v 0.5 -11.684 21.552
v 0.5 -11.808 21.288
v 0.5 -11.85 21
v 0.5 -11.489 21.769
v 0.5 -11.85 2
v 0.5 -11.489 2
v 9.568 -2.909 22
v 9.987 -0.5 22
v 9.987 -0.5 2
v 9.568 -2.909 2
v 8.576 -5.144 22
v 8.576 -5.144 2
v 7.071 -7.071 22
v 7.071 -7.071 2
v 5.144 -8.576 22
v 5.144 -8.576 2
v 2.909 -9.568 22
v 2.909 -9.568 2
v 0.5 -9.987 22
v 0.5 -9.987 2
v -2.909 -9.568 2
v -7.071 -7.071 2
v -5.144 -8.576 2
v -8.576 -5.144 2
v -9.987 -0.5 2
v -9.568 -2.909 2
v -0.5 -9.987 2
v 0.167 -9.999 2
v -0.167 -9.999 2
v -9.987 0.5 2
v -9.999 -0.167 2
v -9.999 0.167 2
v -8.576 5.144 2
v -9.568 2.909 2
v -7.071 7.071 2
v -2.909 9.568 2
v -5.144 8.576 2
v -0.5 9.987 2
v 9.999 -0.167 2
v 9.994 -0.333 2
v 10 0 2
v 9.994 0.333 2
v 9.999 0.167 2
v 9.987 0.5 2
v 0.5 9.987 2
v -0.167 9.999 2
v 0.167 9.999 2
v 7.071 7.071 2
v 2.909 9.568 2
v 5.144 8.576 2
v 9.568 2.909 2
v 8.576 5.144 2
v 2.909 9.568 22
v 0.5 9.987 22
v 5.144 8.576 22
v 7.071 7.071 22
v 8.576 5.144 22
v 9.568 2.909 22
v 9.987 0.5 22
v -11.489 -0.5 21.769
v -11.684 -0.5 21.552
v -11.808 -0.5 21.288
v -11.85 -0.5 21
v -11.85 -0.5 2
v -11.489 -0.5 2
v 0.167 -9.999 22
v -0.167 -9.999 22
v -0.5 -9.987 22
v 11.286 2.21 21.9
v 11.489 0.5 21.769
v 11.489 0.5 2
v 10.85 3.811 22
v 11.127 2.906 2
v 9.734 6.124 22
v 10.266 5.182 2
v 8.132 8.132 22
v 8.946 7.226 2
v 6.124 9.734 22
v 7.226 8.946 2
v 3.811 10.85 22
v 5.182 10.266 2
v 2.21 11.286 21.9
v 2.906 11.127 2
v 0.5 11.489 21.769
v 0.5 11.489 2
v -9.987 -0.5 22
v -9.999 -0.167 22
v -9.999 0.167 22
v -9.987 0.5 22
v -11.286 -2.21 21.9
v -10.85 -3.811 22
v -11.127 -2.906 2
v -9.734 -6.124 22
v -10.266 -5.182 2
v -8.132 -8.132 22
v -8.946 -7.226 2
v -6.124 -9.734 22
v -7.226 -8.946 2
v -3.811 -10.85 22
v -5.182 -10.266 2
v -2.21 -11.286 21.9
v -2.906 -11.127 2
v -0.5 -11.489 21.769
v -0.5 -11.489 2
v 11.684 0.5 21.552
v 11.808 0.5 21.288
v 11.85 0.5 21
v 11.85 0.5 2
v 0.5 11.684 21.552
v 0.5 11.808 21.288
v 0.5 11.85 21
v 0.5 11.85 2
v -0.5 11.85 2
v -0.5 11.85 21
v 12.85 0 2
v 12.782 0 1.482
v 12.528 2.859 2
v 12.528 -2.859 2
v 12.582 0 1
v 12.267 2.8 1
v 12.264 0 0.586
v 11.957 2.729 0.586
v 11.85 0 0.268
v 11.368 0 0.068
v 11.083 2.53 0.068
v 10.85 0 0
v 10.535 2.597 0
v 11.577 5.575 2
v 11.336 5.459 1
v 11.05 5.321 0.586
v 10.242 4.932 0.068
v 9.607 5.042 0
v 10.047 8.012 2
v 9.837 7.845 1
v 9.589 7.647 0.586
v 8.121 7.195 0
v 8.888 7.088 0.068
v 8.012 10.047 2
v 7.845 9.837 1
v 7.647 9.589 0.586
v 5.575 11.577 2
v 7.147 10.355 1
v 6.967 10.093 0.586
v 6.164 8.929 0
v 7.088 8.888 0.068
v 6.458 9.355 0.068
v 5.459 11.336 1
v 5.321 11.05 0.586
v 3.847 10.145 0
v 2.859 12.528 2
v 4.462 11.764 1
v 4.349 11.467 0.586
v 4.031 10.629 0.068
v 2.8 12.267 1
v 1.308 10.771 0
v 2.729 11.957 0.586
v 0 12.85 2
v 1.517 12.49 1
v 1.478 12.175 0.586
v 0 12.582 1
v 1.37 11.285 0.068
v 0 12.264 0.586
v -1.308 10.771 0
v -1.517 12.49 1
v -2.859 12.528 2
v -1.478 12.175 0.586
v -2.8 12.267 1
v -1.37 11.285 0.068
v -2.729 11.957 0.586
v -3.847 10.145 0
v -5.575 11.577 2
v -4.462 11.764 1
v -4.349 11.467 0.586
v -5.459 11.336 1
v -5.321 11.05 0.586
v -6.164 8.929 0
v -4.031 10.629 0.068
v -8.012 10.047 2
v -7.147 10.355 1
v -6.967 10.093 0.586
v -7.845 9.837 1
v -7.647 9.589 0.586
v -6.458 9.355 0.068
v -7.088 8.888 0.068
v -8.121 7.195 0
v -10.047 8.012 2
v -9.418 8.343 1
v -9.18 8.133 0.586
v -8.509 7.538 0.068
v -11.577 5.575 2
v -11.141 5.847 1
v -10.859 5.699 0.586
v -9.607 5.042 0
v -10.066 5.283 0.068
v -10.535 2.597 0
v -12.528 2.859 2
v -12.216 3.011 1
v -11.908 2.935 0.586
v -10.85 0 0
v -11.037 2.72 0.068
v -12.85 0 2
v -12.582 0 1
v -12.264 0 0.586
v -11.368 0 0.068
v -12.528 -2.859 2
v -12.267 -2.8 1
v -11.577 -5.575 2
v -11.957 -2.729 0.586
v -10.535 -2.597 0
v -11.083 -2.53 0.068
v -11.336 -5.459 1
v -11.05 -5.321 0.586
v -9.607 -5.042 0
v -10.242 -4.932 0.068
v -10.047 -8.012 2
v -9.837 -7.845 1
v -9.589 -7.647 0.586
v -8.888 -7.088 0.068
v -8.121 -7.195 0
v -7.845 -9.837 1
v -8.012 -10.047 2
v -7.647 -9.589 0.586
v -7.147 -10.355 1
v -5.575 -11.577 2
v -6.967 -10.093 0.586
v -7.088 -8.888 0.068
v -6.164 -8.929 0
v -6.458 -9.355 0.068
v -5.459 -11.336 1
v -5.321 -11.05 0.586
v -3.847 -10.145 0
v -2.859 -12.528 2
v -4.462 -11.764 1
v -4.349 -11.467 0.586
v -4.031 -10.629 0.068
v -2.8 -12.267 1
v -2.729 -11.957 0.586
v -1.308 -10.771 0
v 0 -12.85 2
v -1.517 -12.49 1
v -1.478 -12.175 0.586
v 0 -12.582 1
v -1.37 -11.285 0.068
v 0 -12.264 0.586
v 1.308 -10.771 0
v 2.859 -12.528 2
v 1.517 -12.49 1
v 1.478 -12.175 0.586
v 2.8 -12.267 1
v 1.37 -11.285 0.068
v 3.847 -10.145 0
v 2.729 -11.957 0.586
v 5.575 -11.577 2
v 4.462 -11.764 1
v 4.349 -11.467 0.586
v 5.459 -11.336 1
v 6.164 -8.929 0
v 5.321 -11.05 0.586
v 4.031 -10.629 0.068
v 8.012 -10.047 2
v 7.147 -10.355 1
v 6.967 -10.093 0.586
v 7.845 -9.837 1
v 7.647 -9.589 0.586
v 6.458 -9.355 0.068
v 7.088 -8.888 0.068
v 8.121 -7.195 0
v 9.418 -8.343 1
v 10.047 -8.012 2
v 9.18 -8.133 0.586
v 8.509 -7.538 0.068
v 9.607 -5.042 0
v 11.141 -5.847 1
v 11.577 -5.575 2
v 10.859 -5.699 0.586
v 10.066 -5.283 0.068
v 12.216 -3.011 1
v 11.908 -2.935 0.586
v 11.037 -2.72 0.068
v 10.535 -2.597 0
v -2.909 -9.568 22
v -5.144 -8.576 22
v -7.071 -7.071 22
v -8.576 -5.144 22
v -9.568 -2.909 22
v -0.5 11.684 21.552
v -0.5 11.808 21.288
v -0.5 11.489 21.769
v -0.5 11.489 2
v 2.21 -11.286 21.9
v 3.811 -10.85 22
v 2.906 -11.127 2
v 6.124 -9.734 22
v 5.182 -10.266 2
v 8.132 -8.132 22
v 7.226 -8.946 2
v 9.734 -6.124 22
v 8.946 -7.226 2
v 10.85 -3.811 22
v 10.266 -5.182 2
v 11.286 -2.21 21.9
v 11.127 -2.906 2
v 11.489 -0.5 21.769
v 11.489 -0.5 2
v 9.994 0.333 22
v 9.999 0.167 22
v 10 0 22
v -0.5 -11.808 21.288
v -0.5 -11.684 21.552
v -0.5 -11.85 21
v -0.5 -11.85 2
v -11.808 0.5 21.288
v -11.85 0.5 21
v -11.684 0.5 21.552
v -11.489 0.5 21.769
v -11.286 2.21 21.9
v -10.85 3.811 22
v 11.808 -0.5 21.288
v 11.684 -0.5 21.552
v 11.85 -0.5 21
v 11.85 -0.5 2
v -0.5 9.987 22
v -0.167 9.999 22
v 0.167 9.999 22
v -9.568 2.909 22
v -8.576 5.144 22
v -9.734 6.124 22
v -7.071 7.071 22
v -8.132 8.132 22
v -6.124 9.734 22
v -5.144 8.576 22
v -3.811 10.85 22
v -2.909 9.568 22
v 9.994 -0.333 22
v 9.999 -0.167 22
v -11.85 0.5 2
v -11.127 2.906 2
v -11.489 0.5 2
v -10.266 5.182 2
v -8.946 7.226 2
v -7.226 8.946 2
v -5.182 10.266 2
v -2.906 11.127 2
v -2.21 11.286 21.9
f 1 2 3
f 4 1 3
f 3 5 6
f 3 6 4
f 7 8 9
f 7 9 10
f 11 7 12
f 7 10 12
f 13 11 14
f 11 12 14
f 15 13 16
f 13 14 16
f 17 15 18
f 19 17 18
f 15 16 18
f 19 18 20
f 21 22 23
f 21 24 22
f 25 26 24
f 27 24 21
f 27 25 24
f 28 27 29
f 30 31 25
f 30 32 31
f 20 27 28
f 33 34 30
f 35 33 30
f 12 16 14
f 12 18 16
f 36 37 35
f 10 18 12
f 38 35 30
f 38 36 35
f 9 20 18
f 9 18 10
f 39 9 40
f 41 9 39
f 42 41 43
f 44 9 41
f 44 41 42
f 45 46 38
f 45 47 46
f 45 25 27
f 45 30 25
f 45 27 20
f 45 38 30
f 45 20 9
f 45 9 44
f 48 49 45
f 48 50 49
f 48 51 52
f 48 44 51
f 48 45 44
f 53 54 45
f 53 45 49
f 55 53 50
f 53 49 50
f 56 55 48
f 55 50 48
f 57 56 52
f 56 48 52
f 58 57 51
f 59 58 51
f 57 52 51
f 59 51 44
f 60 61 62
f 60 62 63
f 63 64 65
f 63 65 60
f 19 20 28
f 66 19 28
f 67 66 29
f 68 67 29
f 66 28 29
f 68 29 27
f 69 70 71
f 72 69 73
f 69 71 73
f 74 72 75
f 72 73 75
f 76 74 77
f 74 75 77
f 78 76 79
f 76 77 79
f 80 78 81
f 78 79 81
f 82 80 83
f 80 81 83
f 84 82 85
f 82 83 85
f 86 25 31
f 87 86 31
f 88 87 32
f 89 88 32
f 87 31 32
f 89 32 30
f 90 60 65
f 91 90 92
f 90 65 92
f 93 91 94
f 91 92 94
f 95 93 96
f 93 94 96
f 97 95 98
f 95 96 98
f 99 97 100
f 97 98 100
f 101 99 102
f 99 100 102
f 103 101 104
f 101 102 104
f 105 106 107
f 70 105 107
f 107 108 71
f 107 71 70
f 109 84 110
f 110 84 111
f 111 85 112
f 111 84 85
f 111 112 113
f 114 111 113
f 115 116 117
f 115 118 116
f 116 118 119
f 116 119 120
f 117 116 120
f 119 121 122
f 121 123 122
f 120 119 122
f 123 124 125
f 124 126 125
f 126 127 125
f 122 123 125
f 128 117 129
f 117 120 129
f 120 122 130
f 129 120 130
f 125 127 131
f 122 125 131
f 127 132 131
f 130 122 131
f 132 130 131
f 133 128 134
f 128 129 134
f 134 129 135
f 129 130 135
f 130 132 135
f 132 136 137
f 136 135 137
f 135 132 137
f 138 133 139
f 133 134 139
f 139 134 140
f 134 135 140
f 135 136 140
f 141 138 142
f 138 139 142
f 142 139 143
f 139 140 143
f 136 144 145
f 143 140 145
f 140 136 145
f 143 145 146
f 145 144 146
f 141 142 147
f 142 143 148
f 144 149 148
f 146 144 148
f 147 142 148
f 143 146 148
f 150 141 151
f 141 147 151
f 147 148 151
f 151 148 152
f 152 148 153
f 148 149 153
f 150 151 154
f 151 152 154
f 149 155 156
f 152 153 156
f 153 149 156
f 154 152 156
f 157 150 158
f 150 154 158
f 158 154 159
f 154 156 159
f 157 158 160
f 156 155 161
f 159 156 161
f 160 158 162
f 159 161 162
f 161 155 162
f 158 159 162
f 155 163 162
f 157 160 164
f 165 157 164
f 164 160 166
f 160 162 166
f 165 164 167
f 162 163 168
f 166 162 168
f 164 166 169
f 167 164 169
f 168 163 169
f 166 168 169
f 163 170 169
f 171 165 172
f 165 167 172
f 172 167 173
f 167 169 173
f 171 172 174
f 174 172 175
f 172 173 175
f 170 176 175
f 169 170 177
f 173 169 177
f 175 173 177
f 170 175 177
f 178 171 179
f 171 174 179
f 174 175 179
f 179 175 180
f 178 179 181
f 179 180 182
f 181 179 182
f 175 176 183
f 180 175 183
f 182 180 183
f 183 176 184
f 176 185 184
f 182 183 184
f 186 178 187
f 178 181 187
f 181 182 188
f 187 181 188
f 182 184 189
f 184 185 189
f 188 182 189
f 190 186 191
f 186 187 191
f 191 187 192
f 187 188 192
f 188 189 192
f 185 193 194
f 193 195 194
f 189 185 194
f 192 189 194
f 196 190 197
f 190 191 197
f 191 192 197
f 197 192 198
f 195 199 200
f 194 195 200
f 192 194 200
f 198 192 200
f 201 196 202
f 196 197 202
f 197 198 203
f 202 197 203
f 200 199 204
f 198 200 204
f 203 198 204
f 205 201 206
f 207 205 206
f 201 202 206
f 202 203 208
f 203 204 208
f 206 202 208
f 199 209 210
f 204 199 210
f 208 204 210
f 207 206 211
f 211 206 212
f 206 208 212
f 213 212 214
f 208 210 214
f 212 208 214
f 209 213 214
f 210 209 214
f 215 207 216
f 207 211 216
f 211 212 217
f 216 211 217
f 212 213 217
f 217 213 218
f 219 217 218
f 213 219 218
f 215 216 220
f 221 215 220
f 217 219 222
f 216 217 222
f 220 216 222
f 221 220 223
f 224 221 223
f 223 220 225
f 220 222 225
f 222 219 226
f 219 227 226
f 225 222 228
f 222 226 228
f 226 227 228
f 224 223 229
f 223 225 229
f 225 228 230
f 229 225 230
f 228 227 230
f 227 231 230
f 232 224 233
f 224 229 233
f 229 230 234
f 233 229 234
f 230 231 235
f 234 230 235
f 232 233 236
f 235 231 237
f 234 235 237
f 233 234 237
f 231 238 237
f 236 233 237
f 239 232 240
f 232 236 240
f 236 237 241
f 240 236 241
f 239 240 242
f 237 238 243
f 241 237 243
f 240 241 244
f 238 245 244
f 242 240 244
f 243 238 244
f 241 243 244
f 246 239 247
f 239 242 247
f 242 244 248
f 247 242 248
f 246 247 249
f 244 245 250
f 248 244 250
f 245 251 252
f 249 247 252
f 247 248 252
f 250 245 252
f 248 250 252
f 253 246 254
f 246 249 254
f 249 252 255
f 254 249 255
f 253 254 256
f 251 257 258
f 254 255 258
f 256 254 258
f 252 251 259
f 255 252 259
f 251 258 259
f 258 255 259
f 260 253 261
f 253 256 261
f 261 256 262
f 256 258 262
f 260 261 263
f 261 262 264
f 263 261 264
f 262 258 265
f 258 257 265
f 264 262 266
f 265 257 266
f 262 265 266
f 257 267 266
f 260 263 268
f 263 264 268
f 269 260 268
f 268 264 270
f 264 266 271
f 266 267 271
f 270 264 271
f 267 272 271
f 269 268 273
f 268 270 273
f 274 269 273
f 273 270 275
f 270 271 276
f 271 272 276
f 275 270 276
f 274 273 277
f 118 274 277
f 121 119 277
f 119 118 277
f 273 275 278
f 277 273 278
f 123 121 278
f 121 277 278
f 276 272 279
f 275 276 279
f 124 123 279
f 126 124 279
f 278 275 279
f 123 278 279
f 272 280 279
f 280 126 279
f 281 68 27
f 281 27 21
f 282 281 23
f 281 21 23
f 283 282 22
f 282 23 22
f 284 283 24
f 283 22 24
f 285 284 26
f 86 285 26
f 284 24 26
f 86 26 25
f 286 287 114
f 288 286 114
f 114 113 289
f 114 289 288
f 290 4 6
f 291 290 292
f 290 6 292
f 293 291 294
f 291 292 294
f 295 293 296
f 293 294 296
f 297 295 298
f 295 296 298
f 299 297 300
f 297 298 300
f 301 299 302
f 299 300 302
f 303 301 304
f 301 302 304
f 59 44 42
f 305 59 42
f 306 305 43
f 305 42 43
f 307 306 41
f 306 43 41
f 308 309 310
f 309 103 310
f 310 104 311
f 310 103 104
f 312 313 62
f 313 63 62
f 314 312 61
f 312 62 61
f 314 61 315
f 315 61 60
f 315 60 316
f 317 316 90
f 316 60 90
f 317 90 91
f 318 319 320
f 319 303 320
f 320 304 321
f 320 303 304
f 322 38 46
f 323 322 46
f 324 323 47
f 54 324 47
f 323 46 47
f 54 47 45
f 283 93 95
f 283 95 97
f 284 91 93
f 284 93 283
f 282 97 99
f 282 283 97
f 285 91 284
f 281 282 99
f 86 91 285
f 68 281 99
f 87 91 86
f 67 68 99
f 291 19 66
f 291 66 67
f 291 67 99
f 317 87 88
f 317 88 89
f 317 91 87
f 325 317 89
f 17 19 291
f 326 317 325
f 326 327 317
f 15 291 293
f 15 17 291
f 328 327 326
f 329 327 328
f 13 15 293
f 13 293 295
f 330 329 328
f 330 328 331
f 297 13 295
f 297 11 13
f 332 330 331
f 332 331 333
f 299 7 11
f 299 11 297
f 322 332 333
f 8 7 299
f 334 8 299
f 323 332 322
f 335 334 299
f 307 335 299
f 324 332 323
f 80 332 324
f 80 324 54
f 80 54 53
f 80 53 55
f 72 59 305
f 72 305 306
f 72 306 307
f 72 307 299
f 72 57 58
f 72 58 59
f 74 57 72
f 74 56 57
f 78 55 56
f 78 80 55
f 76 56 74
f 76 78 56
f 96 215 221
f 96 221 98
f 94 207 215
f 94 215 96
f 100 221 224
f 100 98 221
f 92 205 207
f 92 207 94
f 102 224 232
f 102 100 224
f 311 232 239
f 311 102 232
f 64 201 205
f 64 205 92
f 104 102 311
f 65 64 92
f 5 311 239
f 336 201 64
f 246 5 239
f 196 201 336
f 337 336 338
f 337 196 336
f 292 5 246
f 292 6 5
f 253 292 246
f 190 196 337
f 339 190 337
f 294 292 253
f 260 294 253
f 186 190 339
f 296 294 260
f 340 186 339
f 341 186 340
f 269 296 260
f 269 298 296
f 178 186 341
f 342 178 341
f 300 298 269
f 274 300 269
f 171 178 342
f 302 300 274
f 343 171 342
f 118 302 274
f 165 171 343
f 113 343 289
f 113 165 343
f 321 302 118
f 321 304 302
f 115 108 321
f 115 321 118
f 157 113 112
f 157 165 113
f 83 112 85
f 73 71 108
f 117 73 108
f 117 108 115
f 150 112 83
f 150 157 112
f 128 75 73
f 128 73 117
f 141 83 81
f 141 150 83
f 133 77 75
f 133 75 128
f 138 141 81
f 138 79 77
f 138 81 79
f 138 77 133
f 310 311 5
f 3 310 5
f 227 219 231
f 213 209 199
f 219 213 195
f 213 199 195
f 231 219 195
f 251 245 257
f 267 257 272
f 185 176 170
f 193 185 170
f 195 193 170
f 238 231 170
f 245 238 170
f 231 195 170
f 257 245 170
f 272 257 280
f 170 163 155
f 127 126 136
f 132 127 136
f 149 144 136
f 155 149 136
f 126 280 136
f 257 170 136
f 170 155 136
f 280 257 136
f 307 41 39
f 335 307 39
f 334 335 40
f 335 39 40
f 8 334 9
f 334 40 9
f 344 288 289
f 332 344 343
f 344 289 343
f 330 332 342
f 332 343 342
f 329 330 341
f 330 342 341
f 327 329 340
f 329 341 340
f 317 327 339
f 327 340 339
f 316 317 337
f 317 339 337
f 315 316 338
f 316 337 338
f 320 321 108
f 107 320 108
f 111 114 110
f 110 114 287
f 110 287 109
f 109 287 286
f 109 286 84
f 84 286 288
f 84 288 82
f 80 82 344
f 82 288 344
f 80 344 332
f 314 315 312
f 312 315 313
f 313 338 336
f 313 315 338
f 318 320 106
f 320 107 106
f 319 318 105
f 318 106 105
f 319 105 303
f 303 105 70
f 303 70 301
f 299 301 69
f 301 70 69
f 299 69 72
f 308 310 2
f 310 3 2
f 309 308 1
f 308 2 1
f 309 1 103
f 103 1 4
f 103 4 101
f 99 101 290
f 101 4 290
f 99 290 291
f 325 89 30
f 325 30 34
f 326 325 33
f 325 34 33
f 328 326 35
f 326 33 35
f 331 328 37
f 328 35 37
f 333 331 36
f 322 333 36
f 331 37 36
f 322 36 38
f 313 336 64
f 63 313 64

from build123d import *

# Parameters (mm, degrees)
F0_R     = 12.85
F1_DEPTH = 2
F3_DEPTH = 20
F4_R     = 1
F5_R     = 1.99999


# Not quite as in the source:
# - a fillet or chamfer is up to 0.001 mm smaller than in the source, because OpenCascade refuses the exact size


with BuildPart() as f1:
    # F0 (on Top) → F1 (new body)
    with BuildSketch(Plane.XY):
        Circle(F0_R)
    extrude(amount=F1_DEPTH)

    # F2 (on face) → F3 (join)
    with BuildSketch(Plane.XY.offset(2)):
        with BuildLine():
            ThreePointArc((11.4891252931, -0.5), (11.4972810018, -0.2500591226), (11.5, 0))
            ThreePointArc((11.5, 0), (11.4972810018, 0.2500591226), (11.4891252931, 0.5))
            Line((11.4891252931, 0.5), (9.9874921777, 0.5))
            ThreePointArc((9.9874921777, 0.5), (9.9968725554, 0.2500782106), (10, 0))
            ThreePointArc((10, 0), (9.9968725554, -0.2500782106), (9.9874921777, -0.5))
            Line((9.9874921777, -0.5), (11.4891252931, -0.5))
        make_face()
        with BuildLine():
            ThreePointArc((11.4891252931, 0.5), (11.4972810018, 0.2500591226), (11.5, 0))
            ThreePointArc((11.5, 0), (11.4972810018, -0.2500591226), (11.4891252931, -0.5))
            Line((11.4891252931, -0.5), (11.85, -0.5))
            Line((11.85, -0.5), (11.85, 0.5))
            Line((11.85, 0.5), (11.4891252931, 0.5))
        make_face()
        with BuildLine():
            Line((9.9874921777, 0.5), (11.4891252931, 0.5))
            ThreePointArc((11.4891252931, 0.5), (8.1317279836, 8.1317279836), (0.5, 11.4891252931))
            Line((0.5, 11.4891252931), (0.5, 9.9874921777))
            ThreePointArc((0.5, 9.9874921777), (7.0710678119, 7.0710678119), (9.9874921777, 0.5))
        make_face()
        with BuildLine():
            ThreePointArc((0.5, -11.4891252931), (8.1317279836, -8.1317279836), (11.4891252931, -0.5))
            Line((11.4891252931, -0.5), (9.9874921777, -0.5))
            ThreePointArc((9.9874921777, -0.5), (7.0710678119, -7.0710678119), (0.5, -9.9874921777))
            Line((0.5, -9.9874921777), (0.5, -11.4891252931))
        make_face()
        with BuildLine():
            Line((0.5, 9.9874921777), (0.5, 11.4891252931))
            ThreePointArc((0.5, 11.4891252931), (0, 11.5), (-0.5, 11.4891252931))
            Line((-0.5, 11.4891252931), (-0.5, 9.9874921777))
            ThreePointArc((-0.5, 9.9874921777), (0, 10), (0.5, 9.9874921777))
        make_face()
        with BuildLine():
            ThreePointArc((-0.5, 11.4891252931), (0, 11.5), (0.5, 11.4891252931))
            Line((0.5, 11.4891252931), (0.5, 11.85))
            Line((0.5, 11.85), (-0.5, 11.85))
            Line((-0.5, 11.85), (-0.5, 11.4891252931))
        make_face()
        with BuildLine():
            Line((0.5, -11.85), (0.5, -11.4891252931))
            ThreePointArc((0.5, -11.4891252931), (0, -11.5), (-0.5, -11.4891252931))
            Line((-0.5, -11.4891252931), (-0.5, -11.85))
            Line((-0.5, -11.85), (0.5, -11.85))
        make_face()
        with BuildLine():
            ThreePointArc((-0.5, -11.4891252931), (0, -11.5), (0.5, -11.4891252931))
            Line((0.5, -11.4891252931), (0.5, -9.9874921777))
            ThreePointArc((0.5, -9.9874921777), (0, -10), (-0.5, -9.9874921777))
            Line((-0.5, -9.9874921777), (-0.5, -11.4891252931))
        make_face()
        with BuildLine():
            Line((-0.5, 9.9874921777), (-0.5, 11.4891252931))
            ThreePointArc((-0.5, 11.4891252931), (-8.1317279836, 8.1317279836), (-11.4891252931, 0.5))
            Line((-11.4891252931, 0.5), (-9.9874921777, 0.5))
            ThreePointArc((-9.9874921777, 0.5), (-7.0710678119, 7.0710678119), (-0.5, 9.9874921777))
        make_face()
        with BuildLine():
            ThreePointArc((-11.4891252931, -0.5), (-8.1317279836, -8.1317279836), (-0.5, -11.4891252931))
            Line((-0.5, -11.4891252931), (-0.5, -9.9874921777))
            ThreePointArc((-0.5, -9.9874921777), (-7.0710678119, -7.0710678119), (-9.9874921777, -0.5))
            Line((-9.9874921777, -0.5), (-11.4891252931, -0.5))
        make_face()
        with BuildLine():
            Line((-9.9874921777, 0.5), (-11.4891252931, 0.5))
            ThreePointArc((-11.4891252931, 0.5), (-11.5, 0), (-11.4891252931, -0.5))
            Line((-11.4891252931, -0.5), (-9.9874921777, -0.5))
            ThreePointArc((-9.9874921777, -0.5), (-10, 0), (-9.9874921777, 0.5))
        make_face()
        with BuildLine():
            ThreePointArc((-11.4891252931, -0.5), (-11.5, 0), (-11.4891252931, 0.5))
            Line((-11.4891252931, 0.5), (-11.85, 0.5))
            Line((-11.85, 0.5), (-11.85, -0.5))
            Line((-11.85, -0.5), (-11.4891252931, -0.5))
        make_face()
    extrude(amount=F3_DEPTH)

    # F4
    f4_edges = [f1.edges().sort_by_distance(p)[0] for p in [
        (11.85, 0, 22),
        (0, 11.85, 22),
        (-11.85, 0, 22),
        (0, -11.85, 22),
    ]]
    fillet(f4_edges, radius=F4_R)

    # F5 (radius 2 in the source; OpenCascade refuses exactly that, so slightly less here)
    f5_edges = [f1.edges().sort_by_distance(p)[0] for p in [
        (-12.85, 0, 0),
    ]]
    fillet(f5_edges, radius=F5_R)


solid = f1.part
